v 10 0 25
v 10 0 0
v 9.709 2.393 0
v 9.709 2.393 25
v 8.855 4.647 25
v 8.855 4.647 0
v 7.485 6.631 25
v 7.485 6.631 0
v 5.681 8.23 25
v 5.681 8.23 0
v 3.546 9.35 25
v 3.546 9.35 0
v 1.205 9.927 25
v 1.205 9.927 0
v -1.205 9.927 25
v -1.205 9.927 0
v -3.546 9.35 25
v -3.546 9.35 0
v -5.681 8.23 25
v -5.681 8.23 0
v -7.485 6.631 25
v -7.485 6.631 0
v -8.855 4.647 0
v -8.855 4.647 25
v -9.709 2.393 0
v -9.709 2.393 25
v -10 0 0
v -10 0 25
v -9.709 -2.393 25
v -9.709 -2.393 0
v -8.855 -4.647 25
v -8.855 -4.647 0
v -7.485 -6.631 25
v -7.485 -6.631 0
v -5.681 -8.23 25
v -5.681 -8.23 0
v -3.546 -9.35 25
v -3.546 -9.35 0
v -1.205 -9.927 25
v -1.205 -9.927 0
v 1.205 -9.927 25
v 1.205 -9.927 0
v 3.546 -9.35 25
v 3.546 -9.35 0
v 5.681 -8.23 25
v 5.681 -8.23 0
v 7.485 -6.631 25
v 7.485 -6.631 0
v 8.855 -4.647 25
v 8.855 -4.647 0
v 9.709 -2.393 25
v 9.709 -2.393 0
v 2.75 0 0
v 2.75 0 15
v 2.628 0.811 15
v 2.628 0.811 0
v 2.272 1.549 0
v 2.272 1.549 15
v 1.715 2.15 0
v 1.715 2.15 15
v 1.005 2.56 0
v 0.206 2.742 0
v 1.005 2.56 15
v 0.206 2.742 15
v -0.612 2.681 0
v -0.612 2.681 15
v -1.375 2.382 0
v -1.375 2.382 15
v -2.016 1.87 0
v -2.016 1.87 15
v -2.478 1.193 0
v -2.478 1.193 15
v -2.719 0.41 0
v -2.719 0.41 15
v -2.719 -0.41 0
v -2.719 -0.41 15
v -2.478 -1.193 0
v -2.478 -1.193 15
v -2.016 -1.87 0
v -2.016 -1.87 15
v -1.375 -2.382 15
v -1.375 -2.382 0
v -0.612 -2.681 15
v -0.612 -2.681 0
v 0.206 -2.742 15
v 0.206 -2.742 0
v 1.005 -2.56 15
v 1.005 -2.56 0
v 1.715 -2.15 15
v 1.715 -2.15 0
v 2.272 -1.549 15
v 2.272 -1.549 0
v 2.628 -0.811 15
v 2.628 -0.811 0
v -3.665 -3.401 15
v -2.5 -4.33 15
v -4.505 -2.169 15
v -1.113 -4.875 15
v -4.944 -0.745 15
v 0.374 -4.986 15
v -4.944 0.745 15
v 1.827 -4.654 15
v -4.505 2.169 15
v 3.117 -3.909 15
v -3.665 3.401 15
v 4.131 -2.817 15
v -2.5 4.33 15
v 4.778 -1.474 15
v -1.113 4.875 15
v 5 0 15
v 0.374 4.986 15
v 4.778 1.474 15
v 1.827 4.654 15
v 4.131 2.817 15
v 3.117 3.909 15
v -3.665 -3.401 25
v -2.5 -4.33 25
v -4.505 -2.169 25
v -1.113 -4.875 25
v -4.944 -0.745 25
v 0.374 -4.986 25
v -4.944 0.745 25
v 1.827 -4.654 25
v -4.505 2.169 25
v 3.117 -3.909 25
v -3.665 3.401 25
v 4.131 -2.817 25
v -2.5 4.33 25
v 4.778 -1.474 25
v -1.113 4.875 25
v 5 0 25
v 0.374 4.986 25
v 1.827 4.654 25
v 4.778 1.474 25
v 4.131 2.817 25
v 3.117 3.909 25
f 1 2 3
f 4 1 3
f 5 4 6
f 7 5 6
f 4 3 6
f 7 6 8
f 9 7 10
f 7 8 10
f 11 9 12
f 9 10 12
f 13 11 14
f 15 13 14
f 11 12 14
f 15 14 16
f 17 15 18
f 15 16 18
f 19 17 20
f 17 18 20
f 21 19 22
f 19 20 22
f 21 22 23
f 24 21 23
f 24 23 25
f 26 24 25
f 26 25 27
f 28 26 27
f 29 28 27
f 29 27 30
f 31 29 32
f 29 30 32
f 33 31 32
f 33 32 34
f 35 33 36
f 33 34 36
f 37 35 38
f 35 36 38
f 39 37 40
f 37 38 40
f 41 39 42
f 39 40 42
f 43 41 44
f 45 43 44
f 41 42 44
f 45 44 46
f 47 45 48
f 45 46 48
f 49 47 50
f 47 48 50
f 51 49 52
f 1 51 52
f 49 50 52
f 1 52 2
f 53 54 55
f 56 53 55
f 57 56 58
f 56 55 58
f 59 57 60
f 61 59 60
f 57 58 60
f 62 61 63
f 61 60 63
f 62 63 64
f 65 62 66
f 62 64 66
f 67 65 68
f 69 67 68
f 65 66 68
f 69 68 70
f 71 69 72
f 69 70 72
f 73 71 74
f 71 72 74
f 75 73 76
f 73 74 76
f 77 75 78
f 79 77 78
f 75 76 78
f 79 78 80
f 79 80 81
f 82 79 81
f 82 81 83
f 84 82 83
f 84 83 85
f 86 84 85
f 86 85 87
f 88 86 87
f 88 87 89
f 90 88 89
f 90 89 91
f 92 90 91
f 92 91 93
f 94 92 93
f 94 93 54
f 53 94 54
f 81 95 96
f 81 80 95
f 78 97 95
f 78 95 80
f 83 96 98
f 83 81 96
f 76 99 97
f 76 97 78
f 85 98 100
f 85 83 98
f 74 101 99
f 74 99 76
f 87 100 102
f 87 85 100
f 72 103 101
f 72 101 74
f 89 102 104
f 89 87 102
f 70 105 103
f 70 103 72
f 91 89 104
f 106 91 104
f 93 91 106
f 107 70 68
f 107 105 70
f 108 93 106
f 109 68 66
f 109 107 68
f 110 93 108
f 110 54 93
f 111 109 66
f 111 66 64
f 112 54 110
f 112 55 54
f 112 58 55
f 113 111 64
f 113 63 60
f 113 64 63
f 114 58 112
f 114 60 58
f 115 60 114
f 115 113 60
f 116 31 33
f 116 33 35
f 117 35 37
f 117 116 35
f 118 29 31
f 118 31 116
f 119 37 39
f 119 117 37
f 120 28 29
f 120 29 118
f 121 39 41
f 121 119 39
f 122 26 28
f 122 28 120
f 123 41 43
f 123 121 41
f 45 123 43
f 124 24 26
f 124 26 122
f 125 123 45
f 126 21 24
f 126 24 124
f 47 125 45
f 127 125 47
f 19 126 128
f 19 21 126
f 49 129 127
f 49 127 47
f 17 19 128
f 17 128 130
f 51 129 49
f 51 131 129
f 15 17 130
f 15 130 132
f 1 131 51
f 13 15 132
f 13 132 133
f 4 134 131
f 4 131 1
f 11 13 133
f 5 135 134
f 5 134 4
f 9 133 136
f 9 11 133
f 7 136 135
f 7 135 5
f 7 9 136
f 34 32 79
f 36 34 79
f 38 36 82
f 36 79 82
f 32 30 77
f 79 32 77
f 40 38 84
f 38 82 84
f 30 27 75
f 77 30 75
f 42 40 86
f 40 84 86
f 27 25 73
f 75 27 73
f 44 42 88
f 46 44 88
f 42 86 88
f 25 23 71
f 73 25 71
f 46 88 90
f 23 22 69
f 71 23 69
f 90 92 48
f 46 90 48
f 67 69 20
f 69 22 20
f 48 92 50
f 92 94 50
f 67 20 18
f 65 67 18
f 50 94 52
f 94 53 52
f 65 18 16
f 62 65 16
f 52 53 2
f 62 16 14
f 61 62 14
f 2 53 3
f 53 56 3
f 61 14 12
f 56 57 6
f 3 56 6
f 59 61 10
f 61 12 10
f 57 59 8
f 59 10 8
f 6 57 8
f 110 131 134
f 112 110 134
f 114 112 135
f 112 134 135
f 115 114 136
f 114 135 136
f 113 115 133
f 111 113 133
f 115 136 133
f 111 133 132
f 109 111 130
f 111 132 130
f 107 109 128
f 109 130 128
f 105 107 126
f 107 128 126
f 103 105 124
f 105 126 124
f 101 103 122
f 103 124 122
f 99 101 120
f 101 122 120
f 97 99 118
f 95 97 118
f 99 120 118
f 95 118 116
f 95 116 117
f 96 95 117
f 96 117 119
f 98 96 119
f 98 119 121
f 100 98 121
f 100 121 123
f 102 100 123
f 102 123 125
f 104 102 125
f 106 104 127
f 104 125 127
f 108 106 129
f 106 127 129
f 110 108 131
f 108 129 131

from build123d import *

# Parameters (mm, degrees)
SKETCH_R        = 10
PAD_DEPTH       = 25
SKETCH001_R     = 2.75
POCKET_DEPTH    = 25.001
SKETCH002_R     = 5
POCKET001_DEPTH = 10


with BuildPart() as part:
    # Sketch → Pad (new body)
    with BuildSketch(Plane.XY):
        Circle(SKETCH_R)
    extrude(amount=PAD_DEPTH)

    # Sketch001 (on Face3 of Pad) → Pocket (cut, through all)
    with BuildSketch(Plane.XY.offset(25)):
        Circle(SKETCH001_R)
    extrude(amount=-POCKET_DEPTH, mode=Mode.SUBTRACT)

    # Sketch002 (on Face3 of Pocket) → Pocket001 (cut)
    with BuildSketch(Plane.XY.offset(25)):
        Circle(SKETCH002_R)
    extrude(amount=-POCKET001_DEPTH, mode=Mode.SUBTRACT)


solid = part.part
